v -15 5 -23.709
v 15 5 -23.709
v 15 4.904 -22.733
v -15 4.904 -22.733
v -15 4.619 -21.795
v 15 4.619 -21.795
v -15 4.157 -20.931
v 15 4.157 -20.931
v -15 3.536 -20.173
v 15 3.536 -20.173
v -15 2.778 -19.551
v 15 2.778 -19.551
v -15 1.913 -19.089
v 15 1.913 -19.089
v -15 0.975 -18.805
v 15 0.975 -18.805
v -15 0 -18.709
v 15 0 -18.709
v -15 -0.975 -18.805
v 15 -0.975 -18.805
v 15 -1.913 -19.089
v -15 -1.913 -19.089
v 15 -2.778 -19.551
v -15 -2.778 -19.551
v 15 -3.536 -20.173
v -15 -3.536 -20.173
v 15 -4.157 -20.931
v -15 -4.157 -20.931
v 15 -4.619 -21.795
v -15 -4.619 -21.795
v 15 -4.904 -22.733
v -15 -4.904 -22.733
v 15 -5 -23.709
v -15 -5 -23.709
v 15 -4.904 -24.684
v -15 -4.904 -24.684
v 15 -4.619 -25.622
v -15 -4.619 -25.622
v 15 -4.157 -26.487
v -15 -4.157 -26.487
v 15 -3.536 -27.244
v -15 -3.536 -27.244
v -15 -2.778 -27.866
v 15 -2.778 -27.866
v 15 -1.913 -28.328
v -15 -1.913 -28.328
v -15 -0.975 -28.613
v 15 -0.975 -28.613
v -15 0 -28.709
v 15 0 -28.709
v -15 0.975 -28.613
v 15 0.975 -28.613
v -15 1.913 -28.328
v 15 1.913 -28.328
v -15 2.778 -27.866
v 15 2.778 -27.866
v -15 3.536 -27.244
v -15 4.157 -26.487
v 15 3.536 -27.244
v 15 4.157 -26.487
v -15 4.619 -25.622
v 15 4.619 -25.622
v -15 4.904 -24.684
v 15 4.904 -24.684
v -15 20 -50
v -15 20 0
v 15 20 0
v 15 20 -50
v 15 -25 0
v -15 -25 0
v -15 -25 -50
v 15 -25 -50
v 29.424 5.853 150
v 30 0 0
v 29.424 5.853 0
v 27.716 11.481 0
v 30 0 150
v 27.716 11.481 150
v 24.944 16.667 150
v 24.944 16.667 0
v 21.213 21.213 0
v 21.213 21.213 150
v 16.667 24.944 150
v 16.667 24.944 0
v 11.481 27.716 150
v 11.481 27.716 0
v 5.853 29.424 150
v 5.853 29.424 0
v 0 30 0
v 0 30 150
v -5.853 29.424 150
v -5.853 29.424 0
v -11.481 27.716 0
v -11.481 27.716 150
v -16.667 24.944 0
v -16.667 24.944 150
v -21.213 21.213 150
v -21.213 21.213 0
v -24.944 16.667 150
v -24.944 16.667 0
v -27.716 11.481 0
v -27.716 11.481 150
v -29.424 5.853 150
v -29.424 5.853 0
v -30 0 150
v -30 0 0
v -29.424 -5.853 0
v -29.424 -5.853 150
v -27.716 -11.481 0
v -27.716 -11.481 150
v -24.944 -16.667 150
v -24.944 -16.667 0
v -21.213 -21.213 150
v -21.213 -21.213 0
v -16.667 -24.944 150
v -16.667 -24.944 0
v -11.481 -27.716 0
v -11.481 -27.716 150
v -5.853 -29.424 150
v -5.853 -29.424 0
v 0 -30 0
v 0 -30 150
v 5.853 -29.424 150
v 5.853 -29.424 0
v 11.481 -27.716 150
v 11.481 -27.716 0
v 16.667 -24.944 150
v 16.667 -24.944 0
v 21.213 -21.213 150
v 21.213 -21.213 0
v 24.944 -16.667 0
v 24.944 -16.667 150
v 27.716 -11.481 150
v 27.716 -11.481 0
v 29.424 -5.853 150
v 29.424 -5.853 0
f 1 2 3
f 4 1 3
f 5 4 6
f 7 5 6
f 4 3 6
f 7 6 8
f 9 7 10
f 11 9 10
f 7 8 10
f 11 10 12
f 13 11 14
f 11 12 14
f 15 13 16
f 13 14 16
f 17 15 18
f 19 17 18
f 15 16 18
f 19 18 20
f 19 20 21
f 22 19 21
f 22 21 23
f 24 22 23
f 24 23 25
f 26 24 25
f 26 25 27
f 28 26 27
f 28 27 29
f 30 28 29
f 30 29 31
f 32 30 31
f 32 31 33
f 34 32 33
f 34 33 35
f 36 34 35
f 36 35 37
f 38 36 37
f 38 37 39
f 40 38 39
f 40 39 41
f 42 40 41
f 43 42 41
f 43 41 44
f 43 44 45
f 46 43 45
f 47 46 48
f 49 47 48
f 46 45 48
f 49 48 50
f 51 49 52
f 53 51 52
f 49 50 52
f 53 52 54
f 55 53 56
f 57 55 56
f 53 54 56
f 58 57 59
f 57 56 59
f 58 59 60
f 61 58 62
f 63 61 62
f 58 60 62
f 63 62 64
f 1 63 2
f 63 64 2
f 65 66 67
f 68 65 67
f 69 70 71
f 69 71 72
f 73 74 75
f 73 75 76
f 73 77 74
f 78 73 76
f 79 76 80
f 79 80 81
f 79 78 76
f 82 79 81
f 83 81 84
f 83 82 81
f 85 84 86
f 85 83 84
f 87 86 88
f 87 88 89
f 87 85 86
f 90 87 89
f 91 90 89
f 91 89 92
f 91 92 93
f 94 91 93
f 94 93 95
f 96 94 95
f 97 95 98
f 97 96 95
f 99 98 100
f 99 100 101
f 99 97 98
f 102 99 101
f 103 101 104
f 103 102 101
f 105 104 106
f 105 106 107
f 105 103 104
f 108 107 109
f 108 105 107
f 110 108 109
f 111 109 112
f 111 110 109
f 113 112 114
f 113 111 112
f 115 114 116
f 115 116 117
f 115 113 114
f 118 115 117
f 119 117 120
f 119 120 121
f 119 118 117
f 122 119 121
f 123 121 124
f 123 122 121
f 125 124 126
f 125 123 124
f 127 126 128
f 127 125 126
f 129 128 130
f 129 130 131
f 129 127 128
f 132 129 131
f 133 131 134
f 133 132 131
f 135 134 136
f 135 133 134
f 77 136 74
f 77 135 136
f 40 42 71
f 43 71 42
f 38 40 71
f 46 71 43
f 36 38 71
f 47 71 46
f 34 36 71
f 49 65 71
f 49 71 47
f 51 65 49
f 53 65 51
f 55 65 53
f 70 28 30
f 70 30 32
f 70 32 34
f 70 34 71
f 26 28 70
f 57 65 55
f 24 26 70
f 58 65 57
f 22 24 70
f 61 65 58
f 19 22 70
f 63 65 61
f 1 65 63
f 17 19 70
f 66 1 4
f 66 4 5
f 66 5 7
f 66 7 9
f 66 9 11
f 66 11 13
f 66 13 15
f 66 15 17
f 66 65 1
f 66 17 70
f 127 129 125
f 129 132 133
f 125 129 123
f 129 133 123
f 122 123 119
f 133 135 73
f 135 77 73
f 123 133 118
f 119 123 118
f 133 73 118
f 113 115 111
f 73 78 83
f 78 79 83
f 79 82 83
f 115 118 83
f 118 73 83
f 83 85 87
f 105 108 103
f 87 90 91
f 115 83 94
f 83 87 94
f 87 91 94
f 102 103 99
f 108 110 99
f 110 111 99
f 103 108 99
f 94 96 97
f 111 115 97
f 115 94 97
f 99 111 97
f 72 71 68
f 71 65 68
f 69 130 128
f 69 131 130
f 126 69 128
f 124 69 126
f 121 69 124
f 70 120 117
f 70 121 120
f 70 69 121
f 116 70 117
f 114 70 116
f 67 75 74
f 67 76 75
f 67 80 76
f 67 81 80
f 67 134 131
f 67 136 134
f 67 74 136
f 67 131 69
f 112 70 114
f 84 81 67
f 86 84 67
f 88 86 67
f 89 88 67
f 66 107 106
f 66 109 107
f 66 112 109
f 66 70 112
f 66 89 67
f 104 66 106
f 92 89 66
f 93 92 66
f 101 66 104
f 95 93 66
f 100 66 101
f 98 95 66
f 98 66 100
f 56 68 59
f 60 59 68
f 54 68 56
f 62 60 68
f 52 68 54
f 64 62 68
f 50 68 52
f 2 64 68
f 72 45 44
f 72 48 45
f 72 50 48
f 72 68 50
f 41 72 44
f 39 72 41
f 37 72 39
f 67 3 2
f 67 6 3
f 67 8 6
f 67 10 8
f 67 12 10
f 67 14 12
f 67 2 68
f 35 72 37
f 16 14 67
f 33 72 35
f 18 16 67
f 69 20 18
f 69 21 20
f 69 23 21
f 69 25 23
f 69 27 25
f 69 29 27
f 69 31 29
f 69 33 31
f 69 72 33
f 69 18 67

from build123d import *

# Parameters (mm, degrees)
F0_W          = 30
F0_H          = 150
F2_W          = 30
F2_H          = 100
F3_DEPTH      = 20
F3_DEPTH_BACK = 25
F5_D          = 10


with BuildPart() as f1:
    # F0 (on Front) → F1 (revolve)
    with BuildSketch(Plane.XZ):
        with Locations((15, 75)):
            Rectangle(F0_W, F0_H)
    revolve(axis=Axis((0, 0, 75), (0, 0, 1)))

    # F2 (on Front) → F3 (join, two sides)
    with BuildSketch(Plane.XZ) as f3_sk:
        Rectangle(F2_W, F2_H)
    extrude(amount=-F3_DEPTH)
    extrude(f3_sk.sketch, amount=F3_DEPTH_BACK)

    # F5 (through all)
    with Locations(Plane(origin=(-15, 0, 0), x_dir=(0, -1, 0), z_dir=(-1, 0, 0))):
        with Locations((0, -23.7088240683)):
            Hole(F5_D / 2)


solid = f1.part
